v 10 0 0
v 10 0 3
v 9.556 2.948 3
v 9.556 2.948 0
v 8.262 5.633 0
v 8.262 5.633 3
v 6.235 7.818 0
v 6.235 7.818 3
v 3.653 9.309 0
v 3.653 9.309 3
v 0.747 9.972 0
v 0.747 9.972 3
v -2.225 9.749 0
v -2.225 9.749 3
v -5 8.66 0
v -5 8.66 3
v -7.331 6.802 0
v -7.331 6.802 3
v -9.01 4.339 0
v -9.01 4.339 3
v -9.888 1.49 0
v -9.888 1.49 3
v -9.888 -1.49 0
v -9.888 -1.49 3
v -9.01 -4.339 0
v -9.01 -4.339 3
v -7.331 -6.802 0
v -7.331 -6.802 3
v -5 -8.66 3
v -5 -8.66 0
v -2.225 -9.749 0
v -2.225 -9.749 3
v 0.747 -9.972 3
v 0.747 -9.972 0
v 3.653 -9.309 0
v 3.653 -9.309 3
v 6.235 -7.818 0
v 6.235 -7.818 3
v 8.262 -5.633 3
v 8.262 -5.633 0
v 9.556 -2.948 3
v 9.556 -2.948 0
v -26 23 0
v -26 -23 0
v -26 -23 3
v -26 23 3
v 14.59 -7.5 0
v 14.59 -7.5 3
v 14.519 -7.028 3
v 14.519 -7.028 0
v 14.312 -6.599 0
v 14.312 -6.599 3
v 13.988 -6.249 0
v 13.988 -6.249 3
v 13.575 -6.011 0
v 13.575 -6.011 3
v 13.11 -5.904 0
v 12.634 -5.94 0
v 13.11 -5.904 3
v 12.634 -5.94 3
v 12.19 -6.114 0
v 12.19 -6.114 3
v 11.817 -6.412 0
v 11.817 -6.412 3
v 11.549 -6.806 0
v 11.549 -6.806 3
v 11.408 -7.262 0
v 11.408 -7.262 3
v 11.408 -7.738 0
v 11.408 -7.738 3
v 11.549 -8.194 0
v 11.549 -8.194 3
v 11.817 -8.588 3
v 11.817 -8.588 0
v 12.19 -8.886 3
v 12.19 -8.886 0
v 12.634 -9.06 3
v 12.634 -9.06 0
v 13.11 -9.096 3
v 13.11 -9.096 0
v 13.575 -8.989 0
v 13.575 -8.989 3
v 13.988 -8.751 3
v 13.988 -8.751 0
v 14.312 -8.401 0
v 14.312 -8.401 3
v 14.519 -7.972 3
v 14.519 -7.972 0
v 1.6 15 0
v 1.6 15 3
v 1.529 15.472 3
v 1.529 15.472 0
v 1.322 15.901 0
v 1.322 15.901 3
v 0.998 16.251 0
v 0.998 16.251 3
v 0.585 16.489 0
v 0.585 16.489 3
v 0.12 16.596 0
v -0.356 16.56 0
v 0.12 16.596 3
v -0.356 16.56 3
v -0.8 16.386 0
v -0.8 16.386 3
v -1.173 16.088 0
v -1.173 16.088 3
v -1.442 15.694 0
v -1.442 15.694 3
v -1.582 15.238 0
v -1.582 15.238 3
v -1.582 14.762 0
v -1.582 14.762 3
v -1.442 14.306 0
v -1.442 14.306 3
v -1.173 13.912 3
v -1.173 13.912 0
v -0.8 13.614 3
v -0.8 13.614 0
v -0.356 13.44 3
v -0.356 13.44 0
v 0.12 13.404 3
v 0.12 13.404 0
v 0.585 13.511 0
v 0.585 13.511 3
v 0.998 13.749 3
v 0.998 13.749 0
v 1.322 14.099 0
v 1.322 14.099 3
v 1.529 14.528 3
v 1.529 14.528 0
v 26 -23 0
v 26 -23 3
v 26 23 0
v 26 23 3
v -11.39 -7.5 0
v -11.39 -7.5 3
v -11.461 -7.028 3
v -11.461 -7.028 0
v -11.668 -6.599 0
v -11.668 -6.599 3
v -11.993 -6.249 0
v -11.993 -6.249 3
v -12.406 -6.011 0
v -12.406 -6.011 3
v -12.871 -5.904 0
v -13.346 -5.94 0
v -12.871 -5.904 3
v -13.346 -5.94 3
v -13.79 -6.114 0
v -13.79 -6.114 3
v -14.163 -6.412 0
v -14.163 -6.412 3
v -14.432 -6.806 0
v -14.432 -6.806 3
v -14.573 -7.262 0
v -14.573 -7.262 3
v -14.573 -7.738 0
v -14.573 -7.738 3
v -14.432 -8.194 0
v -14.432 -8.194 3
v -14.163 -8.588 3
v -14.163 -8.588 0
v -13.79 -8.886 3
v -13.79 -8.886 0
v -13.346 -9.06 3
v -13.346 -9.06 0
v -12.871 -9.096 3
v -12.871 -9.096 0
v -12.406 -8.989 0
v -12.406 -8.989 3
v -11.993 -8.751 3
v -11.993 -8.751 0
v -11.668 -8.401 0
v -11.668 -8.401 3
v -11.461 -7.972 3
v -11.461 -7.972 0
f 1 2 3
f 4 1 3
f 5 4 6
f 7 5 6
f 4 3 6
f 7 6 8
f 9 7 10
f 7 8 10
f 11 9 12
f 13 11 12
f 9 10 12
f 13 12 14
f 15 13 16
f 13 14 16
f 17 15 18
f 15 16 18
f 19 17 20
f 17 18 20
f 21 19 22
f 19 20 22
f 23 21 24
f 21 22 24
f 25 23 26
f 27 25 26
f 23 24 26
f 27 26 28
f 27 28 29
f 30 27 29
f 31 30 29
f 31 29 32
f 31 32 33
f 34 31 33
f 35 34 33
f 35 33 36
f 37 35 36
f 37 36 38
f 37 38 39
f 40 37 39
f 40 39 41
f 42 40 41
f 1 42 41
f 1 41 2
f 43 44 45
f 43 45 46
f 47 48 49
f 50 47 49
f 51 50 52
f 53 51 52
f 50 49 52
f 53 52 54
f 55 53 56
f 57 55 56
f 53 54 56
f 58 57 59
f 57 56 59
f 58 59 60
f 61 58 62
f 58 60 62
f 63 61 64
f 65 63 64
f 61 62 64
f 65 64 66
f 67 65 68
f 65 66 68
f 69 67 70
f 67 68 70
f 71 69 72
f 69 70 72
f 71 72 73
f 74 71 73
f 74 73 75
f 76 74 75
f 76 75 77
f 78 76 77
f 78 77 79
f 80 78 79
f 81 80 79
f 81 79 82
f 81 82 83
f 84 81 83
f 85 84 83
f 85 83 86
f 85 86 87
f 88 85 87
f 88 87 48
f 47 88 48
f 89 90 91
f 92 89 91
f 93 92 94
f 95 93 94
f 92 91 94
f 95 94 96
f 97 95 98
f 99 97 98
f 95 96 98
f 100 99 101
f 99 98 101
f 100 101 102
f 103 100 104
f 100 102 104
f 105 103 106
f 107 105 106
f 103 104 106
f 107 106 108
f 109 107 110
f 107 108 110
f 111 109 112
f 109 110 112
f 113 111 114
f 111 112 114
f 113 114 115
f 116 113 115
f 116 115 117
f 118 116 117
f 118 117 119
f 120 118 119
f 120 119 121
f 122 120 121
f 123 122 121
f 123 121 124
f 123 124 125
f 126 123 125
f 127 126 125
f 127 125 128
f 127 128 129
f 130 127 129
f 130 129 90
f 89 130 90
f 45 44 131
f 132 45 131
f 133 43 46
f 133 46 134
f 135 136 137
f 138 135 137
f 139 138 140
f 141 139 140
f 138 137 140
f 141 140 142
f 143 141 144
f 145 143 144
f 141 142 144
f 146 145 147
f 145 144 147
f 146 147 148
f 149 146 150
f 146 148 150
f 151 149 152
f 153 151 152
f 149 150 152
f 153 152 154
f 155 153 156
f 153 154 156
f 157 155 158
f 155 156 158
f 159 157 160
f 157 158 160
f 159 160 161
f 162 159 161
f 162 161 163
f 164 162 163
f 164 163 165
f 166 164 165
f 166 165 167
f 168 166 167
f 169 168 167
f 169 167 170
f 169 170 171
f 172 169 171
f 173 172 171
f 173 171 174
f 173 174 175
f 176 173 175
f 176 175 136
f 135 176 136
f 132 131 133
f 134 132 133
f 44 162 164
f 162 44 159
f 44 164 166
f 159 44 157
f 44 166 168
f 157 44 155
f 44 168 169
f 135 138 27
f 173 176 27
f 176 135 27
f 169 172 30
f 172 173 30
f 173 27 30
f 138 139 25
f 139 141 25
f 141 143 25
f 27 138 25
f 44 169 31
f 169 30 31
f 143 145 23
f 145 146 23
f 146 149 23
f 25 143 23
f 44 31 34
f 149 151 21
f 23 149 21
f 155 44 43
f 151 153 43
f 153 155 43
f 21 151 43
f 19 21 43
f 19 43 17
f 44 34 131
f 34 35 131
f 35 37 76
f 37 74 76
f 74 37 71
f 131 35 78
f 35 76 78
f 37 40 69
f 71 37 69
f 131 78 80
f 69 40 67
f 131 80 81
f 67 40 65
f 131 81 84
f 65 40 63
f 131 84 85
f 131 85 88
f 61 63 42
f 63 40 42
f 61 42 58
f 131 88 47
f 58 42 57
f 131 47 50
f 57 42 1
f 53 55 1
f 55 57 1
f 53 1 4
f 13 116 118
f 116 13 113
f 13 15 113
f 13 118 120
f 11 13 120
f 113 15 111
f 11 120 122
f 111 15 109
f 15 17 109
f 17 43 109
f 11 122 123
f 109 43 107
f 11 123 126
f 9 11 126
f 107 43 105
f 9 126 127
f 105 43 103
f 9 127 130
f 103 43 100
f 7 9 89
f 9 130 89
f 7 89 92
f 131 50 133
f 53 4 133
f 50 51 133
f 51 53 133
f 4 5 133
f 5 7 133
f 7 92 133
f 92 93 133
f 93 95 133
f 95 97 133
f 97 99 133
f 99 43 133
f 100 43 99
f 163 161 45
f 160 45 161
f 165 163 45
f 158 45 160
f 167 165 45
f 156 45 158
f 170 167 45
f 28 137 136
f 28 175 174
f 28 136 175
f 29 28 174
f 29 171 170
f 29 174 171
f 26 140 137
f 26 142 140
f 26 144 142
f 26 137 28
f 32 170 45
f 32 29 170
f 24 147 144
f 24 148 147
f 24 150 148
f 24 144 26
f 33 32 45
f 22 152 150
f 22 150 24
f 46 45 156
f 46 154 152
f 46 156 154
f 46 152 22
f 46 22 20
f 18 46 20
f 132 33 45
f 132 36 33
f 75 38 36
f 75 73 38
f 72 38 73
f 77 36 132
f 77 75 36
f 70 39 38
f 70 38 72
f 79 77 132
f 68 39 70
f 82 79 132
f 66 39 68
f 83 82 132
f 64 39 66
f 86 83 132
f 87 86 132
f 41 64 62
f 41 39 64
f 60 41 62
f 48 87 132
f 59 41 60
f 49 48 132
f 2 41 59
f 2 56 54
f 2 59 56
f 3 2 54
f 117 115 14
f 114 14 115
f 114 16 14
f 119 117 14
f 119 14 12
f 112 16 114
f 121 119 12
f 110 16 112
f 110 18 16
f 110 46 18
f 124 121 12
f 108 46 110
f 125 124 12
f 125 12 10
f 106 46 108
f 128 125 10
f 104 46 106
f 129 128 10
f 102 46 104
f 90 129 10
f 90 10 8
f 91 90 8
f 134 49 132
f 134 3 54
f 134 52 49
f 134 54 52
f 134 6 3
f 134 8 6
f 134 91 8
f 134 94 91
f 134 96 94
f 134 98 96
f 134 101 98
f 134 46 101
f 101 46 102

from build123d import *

# Parameters (mm, degrees)
SKETCH_1_W          = 52
SKETCH_1_H          = 46
EXTRUDE_1_DEPTH     = 3
SKETCH_2_R          = 10
SKETCH_2_R_2        = 1.6
CUT_EXTRUDE_1_DEPTH = 4


with BuildPart() as part:
    # 草图1 → 凸台-拉伸1 (new body)
    with BuildSketch(Plane.XY):
        Rectangle(SKETCH_1_W, SKETCH_1_H)
    extrude(amount=EXTRUDE_1_DEPTH)

    # 草图2 → 切除-拉伸1 (cut, through all)
    with BuildSketch(Plane.XY.offset(3)):
        Circle(SKETCH_2_R)
        with Locations((0, 15)):
            Circle(SKETCH_2_R_2)
        with Locations((12.990381057, -7.5)):
            Circle(SKETCH_2_R_2)
        with Locations((-12.990381057, -7.5)):
            Circle(SKETCH_2_R_2)
    extrude(amount=-CUT_EXTRUDE_1_DEPTH, mode=Mode.SUBTRACT)


solid = part.part
